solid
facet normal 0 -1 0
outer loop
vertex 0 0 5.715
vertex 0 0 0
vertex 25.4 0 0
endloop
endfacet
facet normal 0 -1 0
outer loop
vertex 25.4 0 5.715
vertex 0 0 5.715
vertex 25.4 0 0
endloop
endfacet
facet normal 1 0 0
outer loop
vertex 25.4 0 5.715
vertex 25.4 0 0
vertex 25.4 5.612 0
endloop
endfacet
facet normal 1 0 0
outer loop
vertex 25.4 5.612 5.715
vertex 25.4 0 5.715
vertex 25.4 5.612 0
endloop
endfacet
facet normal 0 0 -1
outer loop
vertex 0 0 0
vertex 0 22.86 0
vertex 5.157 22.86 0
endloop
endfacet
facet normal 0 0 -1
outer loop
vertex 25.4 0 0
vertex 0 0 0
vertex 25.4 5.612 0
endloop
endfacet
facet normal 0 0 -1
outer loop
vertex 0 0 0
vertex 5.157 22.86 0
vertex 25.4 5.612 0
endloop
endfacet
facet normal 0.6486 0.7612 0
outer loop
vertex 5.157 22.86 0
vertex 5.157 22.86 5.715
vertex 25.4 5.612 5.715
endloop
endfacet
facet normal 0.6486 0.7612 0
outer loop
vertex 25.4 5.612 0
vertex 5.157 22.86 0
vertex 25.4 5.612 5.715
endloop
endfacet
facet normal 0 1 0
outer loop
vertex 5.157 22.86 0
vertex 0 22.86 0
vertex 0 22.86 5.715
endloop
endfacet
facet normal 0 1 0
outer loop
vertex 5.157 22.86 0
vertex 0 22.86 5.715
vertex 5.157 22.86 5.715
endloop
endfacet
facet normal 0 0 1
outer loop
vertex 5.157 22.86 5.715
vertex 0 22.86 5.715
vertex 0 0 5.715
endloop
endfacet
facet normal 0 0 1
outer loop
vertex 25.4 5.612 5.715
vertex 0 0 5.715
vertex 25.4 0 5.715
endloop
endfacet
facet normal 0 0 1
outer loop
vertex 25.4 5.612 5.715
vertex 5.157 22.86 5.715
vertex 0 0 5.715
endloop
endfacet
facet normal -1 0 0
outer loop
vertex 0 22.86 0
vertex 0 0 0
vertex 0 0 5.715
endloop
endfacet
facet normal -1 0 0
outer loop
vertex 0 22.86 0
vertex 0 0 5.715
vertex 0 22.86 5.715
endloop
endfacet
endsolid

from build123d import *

# Parameters (mm, degrees)
SKETCH1_W           = 25.4
SKETCH1_H           = 22.86
BOSS_EXTRUDE1_DEPTH = 5.715
CUT_EXTRUDE1_REACH  = 36.647


with BuildPart() as part:
    # Sketch1 → Boss-Extrude1 (new body)
    with BuildSketch(Plane.XY):
        with Locations((12.7, 11.43)):
            Rectangle(SKETCH1_W, SKETCH1_H)
    extrude(amount=BOSS_EXTRUDE1_DEPTH)

    # Sketch2 → Cut-Extrude1 (cut, up to next)
    with BuildSketch(Plane.XY.offset(5.715), mode=Mode.PRIVATE) as cut_extrude1_sk1:
        Polygon((5.15716279, 22.86), (25.4, 5.612386194), (25.4, 22.86), align=None)
    cut_extrude1_tool1 = extrude(cut_extrude1_sk1.sketch, amount=-CUT_EXTRUDE1_REACH, mode=Mode.PRIVATE) & part.part
    add(cut_extrude1_tool1.solids().sort_by_distance((18.652388, 17.110795, 5.715))[0], mode=Mode.SUBTRACT)


solid = part.part
